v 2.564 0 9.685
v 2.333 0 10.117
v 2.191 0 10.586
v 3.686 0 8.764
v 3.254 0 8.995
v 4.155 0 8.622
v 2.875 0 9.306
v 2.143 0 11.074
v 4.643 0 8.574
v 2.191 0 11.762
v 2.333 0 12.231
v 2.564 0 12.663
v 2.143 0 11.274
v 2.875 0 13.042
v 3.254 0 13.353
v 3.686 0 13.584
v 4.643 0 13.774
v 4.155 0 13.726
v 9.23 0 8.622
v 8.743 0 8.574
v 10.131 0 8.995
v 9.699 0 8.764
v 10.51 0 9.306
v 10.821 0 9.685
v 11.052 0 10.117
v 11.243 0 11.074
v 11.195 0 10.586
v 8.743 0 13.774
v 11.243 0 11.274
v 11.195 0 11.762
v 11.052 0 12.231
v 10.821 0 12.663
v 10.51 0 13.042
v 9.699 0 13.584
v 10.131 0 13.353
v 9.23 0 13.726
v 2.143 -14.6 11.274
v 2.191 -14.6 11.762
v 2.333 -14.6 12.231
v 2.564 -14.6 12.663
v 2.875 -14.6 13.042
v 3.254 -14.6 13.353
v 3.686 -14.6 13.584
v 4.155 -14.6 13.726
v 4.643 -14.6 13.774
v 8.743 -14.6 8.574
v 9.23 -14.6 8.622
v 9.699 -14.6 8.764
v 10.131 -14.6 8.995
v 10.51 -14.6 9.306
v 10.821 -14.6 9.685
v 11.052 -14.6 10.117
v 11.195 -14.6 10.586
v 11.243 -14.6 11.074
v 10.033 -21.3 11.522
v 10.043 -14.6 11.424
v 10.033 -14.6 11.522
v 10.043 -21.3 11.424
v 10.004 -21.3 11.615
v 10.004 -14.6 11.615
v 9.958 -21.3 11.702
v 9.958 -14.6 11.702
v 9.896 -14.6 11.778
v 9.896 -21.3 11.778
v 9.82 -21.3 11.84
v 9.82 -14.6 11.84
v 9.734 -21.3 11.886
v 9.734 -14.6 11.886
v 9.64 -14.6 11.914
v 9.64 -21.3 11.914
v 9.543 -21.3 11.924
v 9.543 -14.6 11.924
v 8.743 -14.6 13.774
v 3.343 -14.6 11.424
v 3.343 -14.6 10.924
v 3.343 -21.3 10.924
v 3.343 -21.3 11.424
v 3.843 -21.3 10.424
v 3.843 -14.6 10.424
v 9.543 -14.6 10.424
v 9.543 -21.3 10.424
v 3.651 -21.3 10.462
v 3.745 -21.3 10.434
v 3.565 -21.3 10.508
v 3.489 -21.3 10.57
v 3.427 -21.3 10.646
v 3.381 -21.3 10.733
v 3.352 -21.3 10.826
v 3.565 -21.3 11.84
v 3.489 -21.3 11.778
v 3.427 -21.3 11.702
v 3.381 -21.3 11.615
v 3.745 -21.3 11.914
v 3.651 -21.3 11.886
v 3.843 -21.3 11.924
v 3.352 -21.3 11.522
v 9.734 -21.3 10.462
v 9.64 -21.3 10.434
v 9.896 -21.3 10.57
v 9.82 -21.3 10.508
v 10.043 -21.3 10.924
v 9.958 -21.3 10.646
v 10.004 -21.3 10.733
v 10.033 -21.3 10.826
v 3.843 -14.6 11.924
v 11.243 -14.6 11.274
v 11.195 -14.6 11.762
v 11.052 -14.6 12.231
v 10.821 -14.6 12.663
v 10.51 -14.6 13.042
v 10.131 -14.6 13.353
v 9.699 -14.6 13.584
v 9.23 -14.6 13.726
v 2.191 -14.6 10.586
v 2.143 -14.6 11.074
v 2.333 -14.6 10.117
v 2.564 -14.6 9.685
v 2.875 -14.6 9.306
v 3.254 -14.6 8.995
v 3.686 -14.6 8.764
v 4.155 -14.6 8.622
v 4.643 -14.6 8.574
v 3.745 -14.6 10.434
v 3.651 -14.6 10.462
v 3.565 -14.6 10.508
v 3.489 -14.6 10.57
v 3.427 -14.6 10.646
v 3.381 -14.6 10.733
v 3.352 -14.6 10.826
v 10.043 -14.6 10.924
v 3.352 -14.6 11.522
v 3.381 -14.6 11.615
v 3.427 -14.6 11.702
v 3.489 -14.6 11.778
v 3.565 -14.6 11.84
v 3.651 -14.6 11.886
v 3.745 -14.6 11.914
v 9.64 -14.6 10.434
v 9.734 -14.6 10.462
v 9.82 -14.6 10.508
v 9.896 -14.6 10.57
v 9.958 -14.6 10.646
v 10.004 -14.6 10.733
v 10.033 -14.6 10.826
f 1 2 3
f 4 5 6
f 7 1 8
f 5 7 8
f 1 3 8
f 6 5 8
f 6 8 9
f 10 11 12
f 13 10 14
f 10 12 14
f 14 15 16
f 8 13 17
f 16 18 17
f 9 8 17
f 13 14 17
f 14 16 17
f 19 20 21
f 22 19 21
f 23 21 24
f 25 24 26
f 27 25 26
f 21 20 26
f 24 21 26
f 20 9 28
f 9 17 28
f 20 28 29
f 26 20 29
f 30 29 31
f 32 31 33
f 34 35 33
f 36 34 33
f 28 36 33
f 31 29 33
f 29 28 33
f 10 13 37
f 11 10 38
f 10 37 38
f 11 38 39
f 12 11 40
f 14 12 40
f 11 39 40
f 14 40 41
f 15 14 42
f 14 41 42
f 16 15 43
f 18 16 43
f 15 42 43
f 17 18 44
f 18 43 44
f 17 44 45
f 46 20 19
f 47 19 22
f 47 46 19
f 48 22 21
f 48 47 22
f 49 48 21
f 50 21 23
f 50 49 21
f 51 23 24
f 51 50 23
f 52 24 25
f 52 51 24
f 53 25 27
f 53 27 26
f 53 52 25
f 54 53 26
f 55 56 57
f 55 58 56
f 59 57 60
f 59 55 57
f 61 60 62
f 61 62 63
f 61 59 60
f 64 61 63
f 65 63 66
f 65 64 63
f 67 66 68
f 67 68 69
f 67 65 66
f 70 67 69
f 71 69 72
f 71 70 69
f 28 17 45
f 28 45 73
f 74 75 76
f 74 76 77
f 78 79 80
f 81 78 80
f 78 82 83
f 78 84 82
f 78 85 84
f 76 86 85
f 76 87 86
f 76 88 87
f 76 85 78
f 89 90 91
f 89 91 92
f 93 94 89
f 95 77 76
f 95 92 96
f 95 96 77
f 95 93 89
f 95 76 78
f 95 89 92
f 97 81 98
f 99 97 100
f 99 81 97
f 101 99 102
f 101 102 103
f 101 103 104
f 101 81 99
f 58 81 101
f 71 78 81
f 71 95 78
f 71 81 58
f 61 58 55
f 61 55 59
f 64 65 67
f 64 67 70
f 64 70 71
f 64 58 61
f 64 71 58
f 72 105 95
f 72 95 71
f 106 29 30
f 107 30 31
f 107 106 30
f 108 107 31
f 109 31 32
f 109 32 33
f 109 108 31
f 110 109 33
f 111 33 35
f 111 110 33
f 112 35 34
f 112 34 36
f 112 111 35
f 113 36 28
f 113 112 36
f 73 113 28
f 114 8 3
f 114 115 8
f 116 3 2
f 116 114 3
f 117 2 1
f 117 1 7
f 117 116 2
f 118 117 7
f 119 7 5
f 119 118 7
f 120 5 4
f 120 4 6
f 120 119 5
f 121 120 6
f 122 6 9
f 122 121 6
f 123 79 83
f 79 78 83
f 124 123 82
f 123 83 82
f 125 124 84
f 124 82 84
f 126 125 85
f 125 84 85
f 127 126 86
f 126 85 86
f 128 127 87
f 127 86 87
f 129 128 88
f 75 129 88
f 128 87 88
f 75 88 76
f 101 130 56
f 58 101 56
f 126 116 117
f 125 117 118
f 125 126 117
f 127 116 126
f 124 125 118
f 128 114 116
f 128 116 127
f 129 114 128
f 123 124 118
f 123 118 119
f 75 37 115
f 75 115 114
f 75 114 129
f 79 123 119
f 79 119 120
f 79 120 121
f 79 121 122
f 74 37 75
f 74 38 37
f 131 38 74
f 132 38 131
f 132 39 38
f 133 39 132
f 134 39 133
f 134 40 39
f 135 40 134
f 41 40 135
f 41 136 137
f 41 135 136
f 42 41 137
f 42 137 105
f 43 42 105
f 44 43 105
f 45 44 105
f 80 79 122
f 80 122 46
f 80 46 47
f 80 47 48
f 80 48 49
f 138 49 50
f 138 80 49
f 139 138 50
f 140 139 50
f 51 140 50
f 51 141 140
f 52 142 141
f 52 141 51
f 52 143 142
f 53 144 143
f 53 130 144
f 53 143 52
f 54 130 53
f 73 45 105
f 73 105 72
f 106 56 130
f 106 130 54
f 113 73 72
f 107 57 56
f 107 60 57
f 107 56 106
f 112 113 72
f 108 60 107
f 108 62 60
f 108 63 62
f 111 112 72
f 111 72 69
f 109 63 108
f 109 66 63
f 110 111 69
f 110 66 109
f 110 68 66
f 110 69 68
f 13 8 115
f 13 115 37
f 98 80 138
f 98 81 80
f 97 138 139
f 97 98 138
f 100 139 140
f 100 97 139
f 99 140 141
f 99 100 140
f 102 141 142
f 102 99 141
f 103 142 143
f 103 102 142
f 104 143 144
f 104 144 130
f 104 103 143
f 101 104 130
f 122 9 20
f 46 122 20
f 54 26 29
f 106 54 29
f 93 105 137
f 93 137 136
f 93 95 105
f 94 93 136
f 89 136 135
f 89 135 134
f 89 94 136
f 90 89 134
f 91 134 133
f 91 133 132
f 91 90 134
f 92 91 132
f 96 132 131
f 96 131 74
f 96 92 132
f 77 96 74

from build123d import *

# Parameters (mm, degrees)
F0_W     = 9.1
F0_H     = 5.2
F1_DEPTH = 14.6
F2_R     = 2.5
F3_W     = 6.7
F3_H     = 1.5
F4_DEPTH = 6.7
F5_R     = 0.5


with BuildPart() as f1:
    # F0 (on Front) → F1 (new body)
    with BuildSketch(Plane.XZ):
        with Locations((6.69256, 11.174007)):
            Rectangle(F0_W, F0_H)
    extrude(amount=F1_DEPTH)

    # F2
    f2_edges = [f1.edges().sort_by_distance(p)[0] for p in [
        (11.24256, -7.3, 8.574007),
        (11.24256, -7.3, 13.774007),
        (2.14256, -7.3, 8.574007),
        (2.14256, -7.3, 13.774007),
    ]]
    fillet(f2_edges, radius=F2_R)

    # F3 (on face) → F4 (join)
    with BuildSketch(Plane.XZ.offset(14.6)):
        with Locations((6.69256, 11.174007)):
            Rectangle(F3_W, F3_H)
    extrude(amount=F4_DEPTH)

    # F5
    f5_edges = [f1.edges().sort_by_distance(p)[0] for p in [
        (3.34256, -17.95, 10.424007),
        (10.04256, -17.95, 10.424007),
        (10.04256, -17.95, 11.924007),
        (3.34256, -17.95, 11.924007),
    ]]
    fillet(f5_edges, radius=F5_R)


solid = f1.part
